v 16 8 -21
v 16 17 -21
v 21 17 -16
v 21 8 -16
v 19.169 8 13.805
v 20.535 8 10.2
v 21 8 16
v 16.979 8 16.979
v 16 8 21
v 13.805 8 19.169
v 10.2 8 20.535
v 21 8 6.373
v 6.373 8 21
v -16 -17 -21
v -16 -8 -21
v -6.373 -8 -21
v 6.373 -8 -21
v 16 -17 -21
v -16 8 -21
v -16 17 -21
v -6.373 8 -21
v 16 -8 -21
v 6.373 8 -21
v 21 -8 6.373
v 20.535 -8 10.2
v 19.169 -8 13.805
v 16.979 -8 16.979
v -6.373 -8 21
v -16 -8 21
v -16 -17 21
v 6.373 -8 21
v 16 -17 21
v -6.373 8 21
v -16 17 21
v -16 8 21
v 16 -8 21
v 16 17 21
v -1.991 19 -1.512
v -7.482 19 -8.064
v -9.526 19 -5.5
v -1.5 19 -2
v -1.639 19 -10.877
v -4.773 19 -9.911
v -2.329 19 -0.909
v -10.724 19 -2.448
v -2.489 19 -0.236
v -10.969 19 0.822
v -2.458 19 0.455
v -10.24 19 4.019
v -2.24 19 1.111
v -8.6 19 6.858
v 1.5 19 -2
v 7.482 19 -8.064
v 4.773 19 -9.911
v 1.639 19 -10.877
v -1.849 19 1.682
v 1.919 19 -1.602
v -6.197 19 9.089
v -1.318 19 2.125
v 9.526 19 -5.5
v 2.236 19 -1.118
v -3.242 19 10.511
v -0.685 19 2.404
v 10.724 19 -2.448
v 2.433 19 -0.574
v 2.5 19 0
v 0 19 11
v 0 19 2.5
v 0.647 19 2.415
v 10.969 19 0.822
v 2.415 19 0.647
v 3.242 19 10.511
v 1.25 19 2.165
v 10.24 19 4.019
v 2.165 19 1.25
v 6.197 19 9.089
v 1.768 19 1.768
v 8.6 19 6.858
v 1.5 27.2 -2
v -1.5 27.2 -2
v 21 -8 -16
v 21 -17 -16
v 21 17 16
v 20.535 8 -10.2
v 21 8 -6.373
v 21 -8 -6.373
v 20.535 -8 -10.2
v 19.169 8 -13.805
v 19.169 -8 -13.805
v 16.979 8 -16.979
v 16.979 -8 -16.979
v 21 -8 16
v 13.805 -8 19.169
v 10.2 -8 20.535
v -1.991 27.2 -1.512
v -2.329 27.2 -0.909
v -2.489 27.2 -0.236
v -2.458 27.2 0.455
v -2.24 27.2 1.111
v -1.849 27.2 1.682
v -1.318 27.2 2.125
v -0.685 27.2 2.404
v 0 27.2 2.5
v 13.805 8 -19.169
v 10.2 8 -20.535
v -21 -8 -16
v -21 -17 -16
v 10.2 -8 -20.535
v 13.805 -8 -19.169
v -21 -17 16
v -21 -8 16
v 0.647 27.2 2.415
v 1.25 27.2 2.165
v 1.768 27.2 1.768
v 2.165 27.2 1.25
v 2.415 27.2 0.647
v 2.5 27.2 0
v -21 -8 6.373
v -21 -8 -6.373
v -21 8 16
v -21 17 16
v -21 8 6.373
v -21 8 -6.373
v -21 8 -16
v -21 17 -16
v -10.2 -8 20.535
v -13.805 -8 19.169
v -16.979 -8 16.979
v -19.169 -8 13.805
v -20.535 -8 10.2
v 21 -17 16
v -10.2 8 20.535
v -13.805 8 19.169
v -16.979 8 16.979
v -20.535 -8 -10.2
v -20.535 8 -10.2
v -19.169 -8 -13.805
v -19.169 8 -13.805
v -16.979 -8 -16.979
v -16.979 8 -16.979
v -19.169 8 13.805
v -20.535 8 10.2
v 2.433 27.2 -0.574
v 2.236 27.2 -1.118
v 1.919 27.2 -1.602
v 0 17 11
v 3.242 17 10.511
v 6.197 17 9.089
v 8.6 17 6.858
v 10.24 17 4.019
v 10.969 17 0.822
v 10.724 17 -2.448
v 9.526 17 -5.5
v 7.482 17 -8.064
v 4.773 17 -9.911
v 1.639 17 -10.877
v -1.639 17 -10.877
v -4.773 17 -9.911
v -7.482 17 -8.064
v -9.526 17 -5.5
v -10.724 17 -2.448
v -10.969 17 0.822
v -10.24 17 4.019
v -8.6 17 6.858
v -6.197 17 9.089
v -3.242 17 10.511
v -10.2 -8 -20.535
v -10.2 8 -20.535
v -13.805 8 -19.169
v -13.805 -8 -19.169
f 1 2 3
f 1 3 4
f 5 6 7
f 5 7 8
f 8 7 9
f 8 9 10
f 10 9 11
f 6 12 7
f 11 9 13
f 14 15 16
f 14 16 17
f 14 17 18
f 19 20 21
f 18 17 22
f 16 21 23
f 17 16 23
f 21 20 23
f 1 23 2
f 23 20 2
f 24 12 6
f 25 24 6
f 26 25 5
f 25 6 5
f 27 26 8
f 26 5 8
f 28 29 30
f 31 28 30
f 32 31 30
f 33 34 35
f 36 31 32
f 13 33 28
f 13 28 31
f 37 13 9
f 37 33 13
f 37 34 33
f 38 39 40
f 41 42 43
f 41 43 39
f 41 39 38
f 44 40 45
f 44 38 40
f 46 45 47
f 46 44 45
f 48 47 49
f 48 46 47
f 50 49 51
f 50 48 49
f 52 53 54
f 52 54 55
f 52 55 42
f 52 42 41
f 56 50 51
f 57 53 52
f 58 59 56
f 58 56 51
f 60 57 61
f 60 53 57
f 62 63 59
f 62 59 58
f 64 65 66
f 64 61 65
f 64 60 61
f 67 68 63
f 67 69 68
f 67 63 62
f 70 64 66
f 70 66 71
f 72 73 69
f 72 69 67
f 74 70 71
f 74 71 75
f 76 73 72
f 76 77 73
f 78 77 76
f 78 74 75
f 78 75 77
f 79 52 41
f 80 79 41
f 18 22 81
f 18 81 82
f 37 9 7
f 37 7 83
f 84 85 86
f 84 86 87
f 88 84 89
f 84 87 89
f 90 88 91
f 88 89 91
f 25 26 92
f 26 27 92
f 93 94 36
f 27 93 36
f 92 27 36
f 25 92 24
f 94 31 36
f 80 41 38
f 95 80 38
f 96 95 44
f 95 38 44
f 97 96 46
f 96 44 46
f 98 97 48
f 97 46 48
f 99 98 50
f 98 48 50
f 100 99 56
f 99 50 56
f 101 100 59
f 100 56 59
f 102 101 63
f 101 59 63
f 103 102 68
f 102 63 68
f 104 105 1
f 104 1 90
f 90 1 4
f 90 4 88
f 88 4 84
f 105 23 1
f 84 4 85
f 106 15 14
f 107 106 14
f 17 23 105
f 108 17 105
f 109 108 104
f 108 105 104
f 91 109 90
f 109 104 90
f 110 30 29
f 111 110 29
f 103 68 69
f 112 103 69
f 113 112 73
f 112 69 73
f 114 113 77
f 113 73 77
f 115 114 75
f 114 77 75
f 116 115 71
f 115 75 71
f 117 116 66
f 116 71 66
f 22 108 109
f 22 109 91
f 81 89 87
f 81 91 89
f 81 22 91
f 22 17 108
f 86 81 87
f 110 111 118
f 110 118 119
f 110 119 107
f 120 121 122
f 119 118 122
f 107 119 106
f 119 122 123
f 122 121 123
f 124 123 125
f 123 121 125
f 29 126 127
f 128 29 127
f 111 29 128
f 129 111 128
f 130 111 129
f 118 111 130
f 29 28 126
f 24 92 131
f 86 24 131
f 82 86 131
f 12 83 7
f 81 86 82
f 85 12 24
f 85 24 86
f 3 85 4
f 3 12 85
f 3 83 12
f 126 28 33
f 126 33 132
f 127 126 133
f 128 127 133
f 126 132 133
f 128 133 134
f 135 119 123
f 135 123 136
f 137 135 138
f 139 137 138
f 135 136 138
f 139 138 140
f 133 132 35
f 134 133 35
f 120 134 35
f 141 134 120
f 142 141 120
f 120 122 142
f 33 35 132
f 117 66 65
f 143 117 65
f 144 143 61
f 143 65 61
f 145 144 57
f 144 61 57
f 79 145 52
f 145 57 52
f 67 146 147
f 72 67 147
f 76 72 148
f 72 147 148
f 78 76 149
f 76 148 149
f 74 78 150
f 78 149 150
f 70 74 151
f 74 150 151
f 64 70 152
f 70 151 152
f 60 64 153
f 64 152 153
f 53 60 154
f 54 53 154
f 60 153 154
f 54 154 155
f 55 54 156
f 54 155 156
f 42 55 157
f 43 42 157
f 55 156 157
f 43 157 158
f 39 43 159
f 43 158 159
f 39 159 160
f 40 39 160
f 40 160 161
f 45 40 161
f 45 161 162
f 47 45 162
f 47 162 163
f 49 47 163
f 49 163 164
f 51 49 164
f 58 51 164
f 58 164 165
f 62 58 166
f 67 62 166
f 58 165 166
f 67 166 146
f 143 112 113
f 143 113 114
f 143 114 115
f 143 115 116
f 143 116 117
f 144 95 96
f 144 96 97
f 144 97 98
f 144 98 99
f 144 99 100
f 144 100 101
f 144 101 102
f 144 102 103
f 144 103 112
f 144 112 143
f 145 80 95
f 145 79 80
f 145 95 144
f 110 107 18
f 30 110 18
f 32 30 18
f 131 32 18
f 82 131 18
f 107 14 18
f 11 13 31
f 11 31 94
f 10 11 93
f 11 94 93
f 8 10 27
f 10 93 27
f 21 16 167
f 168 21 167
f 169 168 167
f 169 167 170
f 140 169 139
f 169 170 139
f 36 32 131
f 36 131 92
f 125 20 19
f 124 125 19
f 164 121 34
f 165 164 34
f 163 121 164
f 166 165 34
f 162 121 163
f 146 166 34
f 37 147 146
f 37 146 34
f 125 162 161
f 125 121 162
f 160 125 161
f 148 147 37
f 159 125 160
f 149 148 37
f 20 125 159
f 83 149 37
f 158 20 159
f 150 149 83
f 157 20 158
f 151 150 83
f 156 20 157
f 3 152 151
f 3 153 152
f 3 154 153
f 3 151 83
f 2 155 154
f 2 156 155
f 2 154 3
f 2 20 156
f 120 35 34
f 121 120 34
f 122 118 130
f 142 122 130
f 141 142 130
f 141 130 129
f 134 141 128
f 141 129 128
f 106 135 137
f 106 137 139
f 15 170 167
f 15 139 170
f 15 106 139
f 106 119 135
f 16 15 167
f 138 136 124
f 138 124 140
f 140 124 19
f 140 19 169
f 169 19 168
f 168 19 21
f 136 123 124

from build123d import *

# Parameters (mm, degrees)
SKETCH_1_W               = 42
SKETCH_1_H               = 42
EXTRUDE_1_DEPTH          = 17
CUT_EXTRUDE_1_DEPTH      = 8
PATTERN_CIRCULAR_1_COUNT = 4
FILLET_1_R               = 16
CHAMFER_1_SIZE           = 5
SKETCH_3_R               = 11
EXTRUDE_2_DEPTH          = 2
EXTRUDE_3_DEPTH          = 8.2


with BuildPart() as part:
    # 스케치1 → 보스-돌출1 (new, symmetric)
    with BuildSketch(Plane(origin=(0, 0, 0), x_dir=(1, 0, 0), z_dir=(0, 1, 0))):
        Rectangle(SKETCH_1_W, SKETCH_1_H)
    extrude(amount=EXTRUDE_1_DEPTH, both=True)

    # 스케치2 → 컷-돌출1 (cut, symmetric)
    with BuildSketch(Plane(origin=(0, 0, 0), x_dir=(1, 0, 0), z_dir=(0, 1, 0))):
        Polygon((-21, 13), (-13, 21), (-21, 21), align=None)
    cut_extrude_1 = extrude(amount=CUT_EXTRUDE_1_DEPTH, both=True, mode=Mode.SUBTRACT)

    # 원형 패턴1: 컷-돌출1 ×4 about axis
    pattern_circular_1_axis = Axis((0, 0, 0), (0, 1, 0))
    for i in range(1, PATTERN_CIRCULAR_1_COUNT):
        add(cut_extrude_1.rotate(pattern_circular_1_axis, i * 360 / PATTERN_CIRCULAR_1_COUNT), mode=Mode.SUBTRACT)

    # 필렛1
    # the kernel refuses this fillet: 16 mm, written as the material it takes off along each edge
    with BuildSketch(Plane(origin=(21, -8, -13), x_dir=(0, 0, 1), z_dir=(0, 1, 0)), Plane(origin=(13, 8, -21), x_dir=(-1, 0, 0), z_dir=(0, -1, 0)), Plane(origin=(-21, 8, -13), x_dir=(0, 0, 1), z_dir=(0, -1, 0)), Plane(origin=(-13, 8, 21), x_dir=(1, 0, 0), z_dir=(0, -1, 0)), Plane(origin=(13, -8, 21), x_dir=(-1, 0, 0), z_dir=(0, 1, 0)), Plane(origin=(21, 8, 13), x_dir=(0, 0, -1), z_dir=(0, -1, 0))) as fillet_1_piece_1:
        with BuildLine():
            CenterArc((FILLET_1_R * 0.414213562373, -FILLET_1_R), FILLET_1_R, 90, 45)
            Line((-FILLET_1_R * 0.292893218813, -FILLET_1_R * 0.292893218813), (0, 0))
            Line((0, 0), (FILLET_1_R * 0.414213562373, 0))
        make_face()
    extrude(amount=16, mode=Mode.SUBTRACT)
    with BuildSketch(Plane(origin=(-13, -8, -21), x_dir=(-0.7071067811865475, 0, 0.7071067811865477), z_dir=(0, 1, 0)), Plane(origin=(-21, -8, 13), x_dir=(0.7071067811865472, 0, 0.7071067811865478), z_dir=(0, 1, 0))) as fillet_1_piece_2:
        with BuildLine():
            CenterArc((FILLET_1_R * 0.414213562373, FILLET_1_R), FILLET_1_R, 225, 45)
            Line((-FILLET_1_R * 0.292893218813, FILLET_1_R * 0.292893218813), (0, 0))
            Line((0, 0), (FILLET_1_R * 0.414213562373, 0))
        make_face()
    extrude(amount=16, mode=Mode.SUBTRACT)

    # 모따기1
    chamfer_1_edges = [part.edges().sort_by_distance(p)[0] for p in [
        (-21, -12.5, -21),
        (21, -12.5, 21),
        (-21, -12.5, 21),
        (21, -12.5, -21),
        (21, 12.5, 21),
        (-21, 12.5, 21),
        (-21, 12.5, -21),
        (21, 12.5, -21),
    ]]
    chamfer(chamfer_1_edges, length=CHAMFER_1_SIZE)

    # 스케치3 → 보스-돌출2 (add)
    with BuildSketch(Plane(origin=(0, 17, 0), x_dir=(1, 0, 0), z_dir=(0, 1, 0))):
        with Locations(Location((0, 0, 0), (0, 0, 270))):
            Circle(SKETCH_3_R)
    extrude(amount=EXTRUDE_2_DEPTH)

    # 스케치4 → 보스-돌출3 (add)
    with BuildSketch(Plane(origin=(0, 19, 0), x_dir=(1, 0, 0), z_dir=(0, 1, 0))):
        with BuildLine():
            Line((0, 2), (-1.5, 2))
            ThreePointArc((-1.5, 2), (-2.371708245, -0.790569415), (0, -2.5))
            Line((0, -2.5), (0, 2))
        make_face()
        with BuildLine():
            Line((1.5, 2), (0, 2))
            Line((0, 2), (0, -2.5))
            ThreePointArc((0, -2.5), (1.767766953, -1.767766953), (2.5, 0))
            ThreePointArc((2.5, 0), (2.236067977, 1.118033989), (1.5, 2))
        make_face()
    extrude(amount=EXTRUDE_3_DEPTH)


solid = part.part
